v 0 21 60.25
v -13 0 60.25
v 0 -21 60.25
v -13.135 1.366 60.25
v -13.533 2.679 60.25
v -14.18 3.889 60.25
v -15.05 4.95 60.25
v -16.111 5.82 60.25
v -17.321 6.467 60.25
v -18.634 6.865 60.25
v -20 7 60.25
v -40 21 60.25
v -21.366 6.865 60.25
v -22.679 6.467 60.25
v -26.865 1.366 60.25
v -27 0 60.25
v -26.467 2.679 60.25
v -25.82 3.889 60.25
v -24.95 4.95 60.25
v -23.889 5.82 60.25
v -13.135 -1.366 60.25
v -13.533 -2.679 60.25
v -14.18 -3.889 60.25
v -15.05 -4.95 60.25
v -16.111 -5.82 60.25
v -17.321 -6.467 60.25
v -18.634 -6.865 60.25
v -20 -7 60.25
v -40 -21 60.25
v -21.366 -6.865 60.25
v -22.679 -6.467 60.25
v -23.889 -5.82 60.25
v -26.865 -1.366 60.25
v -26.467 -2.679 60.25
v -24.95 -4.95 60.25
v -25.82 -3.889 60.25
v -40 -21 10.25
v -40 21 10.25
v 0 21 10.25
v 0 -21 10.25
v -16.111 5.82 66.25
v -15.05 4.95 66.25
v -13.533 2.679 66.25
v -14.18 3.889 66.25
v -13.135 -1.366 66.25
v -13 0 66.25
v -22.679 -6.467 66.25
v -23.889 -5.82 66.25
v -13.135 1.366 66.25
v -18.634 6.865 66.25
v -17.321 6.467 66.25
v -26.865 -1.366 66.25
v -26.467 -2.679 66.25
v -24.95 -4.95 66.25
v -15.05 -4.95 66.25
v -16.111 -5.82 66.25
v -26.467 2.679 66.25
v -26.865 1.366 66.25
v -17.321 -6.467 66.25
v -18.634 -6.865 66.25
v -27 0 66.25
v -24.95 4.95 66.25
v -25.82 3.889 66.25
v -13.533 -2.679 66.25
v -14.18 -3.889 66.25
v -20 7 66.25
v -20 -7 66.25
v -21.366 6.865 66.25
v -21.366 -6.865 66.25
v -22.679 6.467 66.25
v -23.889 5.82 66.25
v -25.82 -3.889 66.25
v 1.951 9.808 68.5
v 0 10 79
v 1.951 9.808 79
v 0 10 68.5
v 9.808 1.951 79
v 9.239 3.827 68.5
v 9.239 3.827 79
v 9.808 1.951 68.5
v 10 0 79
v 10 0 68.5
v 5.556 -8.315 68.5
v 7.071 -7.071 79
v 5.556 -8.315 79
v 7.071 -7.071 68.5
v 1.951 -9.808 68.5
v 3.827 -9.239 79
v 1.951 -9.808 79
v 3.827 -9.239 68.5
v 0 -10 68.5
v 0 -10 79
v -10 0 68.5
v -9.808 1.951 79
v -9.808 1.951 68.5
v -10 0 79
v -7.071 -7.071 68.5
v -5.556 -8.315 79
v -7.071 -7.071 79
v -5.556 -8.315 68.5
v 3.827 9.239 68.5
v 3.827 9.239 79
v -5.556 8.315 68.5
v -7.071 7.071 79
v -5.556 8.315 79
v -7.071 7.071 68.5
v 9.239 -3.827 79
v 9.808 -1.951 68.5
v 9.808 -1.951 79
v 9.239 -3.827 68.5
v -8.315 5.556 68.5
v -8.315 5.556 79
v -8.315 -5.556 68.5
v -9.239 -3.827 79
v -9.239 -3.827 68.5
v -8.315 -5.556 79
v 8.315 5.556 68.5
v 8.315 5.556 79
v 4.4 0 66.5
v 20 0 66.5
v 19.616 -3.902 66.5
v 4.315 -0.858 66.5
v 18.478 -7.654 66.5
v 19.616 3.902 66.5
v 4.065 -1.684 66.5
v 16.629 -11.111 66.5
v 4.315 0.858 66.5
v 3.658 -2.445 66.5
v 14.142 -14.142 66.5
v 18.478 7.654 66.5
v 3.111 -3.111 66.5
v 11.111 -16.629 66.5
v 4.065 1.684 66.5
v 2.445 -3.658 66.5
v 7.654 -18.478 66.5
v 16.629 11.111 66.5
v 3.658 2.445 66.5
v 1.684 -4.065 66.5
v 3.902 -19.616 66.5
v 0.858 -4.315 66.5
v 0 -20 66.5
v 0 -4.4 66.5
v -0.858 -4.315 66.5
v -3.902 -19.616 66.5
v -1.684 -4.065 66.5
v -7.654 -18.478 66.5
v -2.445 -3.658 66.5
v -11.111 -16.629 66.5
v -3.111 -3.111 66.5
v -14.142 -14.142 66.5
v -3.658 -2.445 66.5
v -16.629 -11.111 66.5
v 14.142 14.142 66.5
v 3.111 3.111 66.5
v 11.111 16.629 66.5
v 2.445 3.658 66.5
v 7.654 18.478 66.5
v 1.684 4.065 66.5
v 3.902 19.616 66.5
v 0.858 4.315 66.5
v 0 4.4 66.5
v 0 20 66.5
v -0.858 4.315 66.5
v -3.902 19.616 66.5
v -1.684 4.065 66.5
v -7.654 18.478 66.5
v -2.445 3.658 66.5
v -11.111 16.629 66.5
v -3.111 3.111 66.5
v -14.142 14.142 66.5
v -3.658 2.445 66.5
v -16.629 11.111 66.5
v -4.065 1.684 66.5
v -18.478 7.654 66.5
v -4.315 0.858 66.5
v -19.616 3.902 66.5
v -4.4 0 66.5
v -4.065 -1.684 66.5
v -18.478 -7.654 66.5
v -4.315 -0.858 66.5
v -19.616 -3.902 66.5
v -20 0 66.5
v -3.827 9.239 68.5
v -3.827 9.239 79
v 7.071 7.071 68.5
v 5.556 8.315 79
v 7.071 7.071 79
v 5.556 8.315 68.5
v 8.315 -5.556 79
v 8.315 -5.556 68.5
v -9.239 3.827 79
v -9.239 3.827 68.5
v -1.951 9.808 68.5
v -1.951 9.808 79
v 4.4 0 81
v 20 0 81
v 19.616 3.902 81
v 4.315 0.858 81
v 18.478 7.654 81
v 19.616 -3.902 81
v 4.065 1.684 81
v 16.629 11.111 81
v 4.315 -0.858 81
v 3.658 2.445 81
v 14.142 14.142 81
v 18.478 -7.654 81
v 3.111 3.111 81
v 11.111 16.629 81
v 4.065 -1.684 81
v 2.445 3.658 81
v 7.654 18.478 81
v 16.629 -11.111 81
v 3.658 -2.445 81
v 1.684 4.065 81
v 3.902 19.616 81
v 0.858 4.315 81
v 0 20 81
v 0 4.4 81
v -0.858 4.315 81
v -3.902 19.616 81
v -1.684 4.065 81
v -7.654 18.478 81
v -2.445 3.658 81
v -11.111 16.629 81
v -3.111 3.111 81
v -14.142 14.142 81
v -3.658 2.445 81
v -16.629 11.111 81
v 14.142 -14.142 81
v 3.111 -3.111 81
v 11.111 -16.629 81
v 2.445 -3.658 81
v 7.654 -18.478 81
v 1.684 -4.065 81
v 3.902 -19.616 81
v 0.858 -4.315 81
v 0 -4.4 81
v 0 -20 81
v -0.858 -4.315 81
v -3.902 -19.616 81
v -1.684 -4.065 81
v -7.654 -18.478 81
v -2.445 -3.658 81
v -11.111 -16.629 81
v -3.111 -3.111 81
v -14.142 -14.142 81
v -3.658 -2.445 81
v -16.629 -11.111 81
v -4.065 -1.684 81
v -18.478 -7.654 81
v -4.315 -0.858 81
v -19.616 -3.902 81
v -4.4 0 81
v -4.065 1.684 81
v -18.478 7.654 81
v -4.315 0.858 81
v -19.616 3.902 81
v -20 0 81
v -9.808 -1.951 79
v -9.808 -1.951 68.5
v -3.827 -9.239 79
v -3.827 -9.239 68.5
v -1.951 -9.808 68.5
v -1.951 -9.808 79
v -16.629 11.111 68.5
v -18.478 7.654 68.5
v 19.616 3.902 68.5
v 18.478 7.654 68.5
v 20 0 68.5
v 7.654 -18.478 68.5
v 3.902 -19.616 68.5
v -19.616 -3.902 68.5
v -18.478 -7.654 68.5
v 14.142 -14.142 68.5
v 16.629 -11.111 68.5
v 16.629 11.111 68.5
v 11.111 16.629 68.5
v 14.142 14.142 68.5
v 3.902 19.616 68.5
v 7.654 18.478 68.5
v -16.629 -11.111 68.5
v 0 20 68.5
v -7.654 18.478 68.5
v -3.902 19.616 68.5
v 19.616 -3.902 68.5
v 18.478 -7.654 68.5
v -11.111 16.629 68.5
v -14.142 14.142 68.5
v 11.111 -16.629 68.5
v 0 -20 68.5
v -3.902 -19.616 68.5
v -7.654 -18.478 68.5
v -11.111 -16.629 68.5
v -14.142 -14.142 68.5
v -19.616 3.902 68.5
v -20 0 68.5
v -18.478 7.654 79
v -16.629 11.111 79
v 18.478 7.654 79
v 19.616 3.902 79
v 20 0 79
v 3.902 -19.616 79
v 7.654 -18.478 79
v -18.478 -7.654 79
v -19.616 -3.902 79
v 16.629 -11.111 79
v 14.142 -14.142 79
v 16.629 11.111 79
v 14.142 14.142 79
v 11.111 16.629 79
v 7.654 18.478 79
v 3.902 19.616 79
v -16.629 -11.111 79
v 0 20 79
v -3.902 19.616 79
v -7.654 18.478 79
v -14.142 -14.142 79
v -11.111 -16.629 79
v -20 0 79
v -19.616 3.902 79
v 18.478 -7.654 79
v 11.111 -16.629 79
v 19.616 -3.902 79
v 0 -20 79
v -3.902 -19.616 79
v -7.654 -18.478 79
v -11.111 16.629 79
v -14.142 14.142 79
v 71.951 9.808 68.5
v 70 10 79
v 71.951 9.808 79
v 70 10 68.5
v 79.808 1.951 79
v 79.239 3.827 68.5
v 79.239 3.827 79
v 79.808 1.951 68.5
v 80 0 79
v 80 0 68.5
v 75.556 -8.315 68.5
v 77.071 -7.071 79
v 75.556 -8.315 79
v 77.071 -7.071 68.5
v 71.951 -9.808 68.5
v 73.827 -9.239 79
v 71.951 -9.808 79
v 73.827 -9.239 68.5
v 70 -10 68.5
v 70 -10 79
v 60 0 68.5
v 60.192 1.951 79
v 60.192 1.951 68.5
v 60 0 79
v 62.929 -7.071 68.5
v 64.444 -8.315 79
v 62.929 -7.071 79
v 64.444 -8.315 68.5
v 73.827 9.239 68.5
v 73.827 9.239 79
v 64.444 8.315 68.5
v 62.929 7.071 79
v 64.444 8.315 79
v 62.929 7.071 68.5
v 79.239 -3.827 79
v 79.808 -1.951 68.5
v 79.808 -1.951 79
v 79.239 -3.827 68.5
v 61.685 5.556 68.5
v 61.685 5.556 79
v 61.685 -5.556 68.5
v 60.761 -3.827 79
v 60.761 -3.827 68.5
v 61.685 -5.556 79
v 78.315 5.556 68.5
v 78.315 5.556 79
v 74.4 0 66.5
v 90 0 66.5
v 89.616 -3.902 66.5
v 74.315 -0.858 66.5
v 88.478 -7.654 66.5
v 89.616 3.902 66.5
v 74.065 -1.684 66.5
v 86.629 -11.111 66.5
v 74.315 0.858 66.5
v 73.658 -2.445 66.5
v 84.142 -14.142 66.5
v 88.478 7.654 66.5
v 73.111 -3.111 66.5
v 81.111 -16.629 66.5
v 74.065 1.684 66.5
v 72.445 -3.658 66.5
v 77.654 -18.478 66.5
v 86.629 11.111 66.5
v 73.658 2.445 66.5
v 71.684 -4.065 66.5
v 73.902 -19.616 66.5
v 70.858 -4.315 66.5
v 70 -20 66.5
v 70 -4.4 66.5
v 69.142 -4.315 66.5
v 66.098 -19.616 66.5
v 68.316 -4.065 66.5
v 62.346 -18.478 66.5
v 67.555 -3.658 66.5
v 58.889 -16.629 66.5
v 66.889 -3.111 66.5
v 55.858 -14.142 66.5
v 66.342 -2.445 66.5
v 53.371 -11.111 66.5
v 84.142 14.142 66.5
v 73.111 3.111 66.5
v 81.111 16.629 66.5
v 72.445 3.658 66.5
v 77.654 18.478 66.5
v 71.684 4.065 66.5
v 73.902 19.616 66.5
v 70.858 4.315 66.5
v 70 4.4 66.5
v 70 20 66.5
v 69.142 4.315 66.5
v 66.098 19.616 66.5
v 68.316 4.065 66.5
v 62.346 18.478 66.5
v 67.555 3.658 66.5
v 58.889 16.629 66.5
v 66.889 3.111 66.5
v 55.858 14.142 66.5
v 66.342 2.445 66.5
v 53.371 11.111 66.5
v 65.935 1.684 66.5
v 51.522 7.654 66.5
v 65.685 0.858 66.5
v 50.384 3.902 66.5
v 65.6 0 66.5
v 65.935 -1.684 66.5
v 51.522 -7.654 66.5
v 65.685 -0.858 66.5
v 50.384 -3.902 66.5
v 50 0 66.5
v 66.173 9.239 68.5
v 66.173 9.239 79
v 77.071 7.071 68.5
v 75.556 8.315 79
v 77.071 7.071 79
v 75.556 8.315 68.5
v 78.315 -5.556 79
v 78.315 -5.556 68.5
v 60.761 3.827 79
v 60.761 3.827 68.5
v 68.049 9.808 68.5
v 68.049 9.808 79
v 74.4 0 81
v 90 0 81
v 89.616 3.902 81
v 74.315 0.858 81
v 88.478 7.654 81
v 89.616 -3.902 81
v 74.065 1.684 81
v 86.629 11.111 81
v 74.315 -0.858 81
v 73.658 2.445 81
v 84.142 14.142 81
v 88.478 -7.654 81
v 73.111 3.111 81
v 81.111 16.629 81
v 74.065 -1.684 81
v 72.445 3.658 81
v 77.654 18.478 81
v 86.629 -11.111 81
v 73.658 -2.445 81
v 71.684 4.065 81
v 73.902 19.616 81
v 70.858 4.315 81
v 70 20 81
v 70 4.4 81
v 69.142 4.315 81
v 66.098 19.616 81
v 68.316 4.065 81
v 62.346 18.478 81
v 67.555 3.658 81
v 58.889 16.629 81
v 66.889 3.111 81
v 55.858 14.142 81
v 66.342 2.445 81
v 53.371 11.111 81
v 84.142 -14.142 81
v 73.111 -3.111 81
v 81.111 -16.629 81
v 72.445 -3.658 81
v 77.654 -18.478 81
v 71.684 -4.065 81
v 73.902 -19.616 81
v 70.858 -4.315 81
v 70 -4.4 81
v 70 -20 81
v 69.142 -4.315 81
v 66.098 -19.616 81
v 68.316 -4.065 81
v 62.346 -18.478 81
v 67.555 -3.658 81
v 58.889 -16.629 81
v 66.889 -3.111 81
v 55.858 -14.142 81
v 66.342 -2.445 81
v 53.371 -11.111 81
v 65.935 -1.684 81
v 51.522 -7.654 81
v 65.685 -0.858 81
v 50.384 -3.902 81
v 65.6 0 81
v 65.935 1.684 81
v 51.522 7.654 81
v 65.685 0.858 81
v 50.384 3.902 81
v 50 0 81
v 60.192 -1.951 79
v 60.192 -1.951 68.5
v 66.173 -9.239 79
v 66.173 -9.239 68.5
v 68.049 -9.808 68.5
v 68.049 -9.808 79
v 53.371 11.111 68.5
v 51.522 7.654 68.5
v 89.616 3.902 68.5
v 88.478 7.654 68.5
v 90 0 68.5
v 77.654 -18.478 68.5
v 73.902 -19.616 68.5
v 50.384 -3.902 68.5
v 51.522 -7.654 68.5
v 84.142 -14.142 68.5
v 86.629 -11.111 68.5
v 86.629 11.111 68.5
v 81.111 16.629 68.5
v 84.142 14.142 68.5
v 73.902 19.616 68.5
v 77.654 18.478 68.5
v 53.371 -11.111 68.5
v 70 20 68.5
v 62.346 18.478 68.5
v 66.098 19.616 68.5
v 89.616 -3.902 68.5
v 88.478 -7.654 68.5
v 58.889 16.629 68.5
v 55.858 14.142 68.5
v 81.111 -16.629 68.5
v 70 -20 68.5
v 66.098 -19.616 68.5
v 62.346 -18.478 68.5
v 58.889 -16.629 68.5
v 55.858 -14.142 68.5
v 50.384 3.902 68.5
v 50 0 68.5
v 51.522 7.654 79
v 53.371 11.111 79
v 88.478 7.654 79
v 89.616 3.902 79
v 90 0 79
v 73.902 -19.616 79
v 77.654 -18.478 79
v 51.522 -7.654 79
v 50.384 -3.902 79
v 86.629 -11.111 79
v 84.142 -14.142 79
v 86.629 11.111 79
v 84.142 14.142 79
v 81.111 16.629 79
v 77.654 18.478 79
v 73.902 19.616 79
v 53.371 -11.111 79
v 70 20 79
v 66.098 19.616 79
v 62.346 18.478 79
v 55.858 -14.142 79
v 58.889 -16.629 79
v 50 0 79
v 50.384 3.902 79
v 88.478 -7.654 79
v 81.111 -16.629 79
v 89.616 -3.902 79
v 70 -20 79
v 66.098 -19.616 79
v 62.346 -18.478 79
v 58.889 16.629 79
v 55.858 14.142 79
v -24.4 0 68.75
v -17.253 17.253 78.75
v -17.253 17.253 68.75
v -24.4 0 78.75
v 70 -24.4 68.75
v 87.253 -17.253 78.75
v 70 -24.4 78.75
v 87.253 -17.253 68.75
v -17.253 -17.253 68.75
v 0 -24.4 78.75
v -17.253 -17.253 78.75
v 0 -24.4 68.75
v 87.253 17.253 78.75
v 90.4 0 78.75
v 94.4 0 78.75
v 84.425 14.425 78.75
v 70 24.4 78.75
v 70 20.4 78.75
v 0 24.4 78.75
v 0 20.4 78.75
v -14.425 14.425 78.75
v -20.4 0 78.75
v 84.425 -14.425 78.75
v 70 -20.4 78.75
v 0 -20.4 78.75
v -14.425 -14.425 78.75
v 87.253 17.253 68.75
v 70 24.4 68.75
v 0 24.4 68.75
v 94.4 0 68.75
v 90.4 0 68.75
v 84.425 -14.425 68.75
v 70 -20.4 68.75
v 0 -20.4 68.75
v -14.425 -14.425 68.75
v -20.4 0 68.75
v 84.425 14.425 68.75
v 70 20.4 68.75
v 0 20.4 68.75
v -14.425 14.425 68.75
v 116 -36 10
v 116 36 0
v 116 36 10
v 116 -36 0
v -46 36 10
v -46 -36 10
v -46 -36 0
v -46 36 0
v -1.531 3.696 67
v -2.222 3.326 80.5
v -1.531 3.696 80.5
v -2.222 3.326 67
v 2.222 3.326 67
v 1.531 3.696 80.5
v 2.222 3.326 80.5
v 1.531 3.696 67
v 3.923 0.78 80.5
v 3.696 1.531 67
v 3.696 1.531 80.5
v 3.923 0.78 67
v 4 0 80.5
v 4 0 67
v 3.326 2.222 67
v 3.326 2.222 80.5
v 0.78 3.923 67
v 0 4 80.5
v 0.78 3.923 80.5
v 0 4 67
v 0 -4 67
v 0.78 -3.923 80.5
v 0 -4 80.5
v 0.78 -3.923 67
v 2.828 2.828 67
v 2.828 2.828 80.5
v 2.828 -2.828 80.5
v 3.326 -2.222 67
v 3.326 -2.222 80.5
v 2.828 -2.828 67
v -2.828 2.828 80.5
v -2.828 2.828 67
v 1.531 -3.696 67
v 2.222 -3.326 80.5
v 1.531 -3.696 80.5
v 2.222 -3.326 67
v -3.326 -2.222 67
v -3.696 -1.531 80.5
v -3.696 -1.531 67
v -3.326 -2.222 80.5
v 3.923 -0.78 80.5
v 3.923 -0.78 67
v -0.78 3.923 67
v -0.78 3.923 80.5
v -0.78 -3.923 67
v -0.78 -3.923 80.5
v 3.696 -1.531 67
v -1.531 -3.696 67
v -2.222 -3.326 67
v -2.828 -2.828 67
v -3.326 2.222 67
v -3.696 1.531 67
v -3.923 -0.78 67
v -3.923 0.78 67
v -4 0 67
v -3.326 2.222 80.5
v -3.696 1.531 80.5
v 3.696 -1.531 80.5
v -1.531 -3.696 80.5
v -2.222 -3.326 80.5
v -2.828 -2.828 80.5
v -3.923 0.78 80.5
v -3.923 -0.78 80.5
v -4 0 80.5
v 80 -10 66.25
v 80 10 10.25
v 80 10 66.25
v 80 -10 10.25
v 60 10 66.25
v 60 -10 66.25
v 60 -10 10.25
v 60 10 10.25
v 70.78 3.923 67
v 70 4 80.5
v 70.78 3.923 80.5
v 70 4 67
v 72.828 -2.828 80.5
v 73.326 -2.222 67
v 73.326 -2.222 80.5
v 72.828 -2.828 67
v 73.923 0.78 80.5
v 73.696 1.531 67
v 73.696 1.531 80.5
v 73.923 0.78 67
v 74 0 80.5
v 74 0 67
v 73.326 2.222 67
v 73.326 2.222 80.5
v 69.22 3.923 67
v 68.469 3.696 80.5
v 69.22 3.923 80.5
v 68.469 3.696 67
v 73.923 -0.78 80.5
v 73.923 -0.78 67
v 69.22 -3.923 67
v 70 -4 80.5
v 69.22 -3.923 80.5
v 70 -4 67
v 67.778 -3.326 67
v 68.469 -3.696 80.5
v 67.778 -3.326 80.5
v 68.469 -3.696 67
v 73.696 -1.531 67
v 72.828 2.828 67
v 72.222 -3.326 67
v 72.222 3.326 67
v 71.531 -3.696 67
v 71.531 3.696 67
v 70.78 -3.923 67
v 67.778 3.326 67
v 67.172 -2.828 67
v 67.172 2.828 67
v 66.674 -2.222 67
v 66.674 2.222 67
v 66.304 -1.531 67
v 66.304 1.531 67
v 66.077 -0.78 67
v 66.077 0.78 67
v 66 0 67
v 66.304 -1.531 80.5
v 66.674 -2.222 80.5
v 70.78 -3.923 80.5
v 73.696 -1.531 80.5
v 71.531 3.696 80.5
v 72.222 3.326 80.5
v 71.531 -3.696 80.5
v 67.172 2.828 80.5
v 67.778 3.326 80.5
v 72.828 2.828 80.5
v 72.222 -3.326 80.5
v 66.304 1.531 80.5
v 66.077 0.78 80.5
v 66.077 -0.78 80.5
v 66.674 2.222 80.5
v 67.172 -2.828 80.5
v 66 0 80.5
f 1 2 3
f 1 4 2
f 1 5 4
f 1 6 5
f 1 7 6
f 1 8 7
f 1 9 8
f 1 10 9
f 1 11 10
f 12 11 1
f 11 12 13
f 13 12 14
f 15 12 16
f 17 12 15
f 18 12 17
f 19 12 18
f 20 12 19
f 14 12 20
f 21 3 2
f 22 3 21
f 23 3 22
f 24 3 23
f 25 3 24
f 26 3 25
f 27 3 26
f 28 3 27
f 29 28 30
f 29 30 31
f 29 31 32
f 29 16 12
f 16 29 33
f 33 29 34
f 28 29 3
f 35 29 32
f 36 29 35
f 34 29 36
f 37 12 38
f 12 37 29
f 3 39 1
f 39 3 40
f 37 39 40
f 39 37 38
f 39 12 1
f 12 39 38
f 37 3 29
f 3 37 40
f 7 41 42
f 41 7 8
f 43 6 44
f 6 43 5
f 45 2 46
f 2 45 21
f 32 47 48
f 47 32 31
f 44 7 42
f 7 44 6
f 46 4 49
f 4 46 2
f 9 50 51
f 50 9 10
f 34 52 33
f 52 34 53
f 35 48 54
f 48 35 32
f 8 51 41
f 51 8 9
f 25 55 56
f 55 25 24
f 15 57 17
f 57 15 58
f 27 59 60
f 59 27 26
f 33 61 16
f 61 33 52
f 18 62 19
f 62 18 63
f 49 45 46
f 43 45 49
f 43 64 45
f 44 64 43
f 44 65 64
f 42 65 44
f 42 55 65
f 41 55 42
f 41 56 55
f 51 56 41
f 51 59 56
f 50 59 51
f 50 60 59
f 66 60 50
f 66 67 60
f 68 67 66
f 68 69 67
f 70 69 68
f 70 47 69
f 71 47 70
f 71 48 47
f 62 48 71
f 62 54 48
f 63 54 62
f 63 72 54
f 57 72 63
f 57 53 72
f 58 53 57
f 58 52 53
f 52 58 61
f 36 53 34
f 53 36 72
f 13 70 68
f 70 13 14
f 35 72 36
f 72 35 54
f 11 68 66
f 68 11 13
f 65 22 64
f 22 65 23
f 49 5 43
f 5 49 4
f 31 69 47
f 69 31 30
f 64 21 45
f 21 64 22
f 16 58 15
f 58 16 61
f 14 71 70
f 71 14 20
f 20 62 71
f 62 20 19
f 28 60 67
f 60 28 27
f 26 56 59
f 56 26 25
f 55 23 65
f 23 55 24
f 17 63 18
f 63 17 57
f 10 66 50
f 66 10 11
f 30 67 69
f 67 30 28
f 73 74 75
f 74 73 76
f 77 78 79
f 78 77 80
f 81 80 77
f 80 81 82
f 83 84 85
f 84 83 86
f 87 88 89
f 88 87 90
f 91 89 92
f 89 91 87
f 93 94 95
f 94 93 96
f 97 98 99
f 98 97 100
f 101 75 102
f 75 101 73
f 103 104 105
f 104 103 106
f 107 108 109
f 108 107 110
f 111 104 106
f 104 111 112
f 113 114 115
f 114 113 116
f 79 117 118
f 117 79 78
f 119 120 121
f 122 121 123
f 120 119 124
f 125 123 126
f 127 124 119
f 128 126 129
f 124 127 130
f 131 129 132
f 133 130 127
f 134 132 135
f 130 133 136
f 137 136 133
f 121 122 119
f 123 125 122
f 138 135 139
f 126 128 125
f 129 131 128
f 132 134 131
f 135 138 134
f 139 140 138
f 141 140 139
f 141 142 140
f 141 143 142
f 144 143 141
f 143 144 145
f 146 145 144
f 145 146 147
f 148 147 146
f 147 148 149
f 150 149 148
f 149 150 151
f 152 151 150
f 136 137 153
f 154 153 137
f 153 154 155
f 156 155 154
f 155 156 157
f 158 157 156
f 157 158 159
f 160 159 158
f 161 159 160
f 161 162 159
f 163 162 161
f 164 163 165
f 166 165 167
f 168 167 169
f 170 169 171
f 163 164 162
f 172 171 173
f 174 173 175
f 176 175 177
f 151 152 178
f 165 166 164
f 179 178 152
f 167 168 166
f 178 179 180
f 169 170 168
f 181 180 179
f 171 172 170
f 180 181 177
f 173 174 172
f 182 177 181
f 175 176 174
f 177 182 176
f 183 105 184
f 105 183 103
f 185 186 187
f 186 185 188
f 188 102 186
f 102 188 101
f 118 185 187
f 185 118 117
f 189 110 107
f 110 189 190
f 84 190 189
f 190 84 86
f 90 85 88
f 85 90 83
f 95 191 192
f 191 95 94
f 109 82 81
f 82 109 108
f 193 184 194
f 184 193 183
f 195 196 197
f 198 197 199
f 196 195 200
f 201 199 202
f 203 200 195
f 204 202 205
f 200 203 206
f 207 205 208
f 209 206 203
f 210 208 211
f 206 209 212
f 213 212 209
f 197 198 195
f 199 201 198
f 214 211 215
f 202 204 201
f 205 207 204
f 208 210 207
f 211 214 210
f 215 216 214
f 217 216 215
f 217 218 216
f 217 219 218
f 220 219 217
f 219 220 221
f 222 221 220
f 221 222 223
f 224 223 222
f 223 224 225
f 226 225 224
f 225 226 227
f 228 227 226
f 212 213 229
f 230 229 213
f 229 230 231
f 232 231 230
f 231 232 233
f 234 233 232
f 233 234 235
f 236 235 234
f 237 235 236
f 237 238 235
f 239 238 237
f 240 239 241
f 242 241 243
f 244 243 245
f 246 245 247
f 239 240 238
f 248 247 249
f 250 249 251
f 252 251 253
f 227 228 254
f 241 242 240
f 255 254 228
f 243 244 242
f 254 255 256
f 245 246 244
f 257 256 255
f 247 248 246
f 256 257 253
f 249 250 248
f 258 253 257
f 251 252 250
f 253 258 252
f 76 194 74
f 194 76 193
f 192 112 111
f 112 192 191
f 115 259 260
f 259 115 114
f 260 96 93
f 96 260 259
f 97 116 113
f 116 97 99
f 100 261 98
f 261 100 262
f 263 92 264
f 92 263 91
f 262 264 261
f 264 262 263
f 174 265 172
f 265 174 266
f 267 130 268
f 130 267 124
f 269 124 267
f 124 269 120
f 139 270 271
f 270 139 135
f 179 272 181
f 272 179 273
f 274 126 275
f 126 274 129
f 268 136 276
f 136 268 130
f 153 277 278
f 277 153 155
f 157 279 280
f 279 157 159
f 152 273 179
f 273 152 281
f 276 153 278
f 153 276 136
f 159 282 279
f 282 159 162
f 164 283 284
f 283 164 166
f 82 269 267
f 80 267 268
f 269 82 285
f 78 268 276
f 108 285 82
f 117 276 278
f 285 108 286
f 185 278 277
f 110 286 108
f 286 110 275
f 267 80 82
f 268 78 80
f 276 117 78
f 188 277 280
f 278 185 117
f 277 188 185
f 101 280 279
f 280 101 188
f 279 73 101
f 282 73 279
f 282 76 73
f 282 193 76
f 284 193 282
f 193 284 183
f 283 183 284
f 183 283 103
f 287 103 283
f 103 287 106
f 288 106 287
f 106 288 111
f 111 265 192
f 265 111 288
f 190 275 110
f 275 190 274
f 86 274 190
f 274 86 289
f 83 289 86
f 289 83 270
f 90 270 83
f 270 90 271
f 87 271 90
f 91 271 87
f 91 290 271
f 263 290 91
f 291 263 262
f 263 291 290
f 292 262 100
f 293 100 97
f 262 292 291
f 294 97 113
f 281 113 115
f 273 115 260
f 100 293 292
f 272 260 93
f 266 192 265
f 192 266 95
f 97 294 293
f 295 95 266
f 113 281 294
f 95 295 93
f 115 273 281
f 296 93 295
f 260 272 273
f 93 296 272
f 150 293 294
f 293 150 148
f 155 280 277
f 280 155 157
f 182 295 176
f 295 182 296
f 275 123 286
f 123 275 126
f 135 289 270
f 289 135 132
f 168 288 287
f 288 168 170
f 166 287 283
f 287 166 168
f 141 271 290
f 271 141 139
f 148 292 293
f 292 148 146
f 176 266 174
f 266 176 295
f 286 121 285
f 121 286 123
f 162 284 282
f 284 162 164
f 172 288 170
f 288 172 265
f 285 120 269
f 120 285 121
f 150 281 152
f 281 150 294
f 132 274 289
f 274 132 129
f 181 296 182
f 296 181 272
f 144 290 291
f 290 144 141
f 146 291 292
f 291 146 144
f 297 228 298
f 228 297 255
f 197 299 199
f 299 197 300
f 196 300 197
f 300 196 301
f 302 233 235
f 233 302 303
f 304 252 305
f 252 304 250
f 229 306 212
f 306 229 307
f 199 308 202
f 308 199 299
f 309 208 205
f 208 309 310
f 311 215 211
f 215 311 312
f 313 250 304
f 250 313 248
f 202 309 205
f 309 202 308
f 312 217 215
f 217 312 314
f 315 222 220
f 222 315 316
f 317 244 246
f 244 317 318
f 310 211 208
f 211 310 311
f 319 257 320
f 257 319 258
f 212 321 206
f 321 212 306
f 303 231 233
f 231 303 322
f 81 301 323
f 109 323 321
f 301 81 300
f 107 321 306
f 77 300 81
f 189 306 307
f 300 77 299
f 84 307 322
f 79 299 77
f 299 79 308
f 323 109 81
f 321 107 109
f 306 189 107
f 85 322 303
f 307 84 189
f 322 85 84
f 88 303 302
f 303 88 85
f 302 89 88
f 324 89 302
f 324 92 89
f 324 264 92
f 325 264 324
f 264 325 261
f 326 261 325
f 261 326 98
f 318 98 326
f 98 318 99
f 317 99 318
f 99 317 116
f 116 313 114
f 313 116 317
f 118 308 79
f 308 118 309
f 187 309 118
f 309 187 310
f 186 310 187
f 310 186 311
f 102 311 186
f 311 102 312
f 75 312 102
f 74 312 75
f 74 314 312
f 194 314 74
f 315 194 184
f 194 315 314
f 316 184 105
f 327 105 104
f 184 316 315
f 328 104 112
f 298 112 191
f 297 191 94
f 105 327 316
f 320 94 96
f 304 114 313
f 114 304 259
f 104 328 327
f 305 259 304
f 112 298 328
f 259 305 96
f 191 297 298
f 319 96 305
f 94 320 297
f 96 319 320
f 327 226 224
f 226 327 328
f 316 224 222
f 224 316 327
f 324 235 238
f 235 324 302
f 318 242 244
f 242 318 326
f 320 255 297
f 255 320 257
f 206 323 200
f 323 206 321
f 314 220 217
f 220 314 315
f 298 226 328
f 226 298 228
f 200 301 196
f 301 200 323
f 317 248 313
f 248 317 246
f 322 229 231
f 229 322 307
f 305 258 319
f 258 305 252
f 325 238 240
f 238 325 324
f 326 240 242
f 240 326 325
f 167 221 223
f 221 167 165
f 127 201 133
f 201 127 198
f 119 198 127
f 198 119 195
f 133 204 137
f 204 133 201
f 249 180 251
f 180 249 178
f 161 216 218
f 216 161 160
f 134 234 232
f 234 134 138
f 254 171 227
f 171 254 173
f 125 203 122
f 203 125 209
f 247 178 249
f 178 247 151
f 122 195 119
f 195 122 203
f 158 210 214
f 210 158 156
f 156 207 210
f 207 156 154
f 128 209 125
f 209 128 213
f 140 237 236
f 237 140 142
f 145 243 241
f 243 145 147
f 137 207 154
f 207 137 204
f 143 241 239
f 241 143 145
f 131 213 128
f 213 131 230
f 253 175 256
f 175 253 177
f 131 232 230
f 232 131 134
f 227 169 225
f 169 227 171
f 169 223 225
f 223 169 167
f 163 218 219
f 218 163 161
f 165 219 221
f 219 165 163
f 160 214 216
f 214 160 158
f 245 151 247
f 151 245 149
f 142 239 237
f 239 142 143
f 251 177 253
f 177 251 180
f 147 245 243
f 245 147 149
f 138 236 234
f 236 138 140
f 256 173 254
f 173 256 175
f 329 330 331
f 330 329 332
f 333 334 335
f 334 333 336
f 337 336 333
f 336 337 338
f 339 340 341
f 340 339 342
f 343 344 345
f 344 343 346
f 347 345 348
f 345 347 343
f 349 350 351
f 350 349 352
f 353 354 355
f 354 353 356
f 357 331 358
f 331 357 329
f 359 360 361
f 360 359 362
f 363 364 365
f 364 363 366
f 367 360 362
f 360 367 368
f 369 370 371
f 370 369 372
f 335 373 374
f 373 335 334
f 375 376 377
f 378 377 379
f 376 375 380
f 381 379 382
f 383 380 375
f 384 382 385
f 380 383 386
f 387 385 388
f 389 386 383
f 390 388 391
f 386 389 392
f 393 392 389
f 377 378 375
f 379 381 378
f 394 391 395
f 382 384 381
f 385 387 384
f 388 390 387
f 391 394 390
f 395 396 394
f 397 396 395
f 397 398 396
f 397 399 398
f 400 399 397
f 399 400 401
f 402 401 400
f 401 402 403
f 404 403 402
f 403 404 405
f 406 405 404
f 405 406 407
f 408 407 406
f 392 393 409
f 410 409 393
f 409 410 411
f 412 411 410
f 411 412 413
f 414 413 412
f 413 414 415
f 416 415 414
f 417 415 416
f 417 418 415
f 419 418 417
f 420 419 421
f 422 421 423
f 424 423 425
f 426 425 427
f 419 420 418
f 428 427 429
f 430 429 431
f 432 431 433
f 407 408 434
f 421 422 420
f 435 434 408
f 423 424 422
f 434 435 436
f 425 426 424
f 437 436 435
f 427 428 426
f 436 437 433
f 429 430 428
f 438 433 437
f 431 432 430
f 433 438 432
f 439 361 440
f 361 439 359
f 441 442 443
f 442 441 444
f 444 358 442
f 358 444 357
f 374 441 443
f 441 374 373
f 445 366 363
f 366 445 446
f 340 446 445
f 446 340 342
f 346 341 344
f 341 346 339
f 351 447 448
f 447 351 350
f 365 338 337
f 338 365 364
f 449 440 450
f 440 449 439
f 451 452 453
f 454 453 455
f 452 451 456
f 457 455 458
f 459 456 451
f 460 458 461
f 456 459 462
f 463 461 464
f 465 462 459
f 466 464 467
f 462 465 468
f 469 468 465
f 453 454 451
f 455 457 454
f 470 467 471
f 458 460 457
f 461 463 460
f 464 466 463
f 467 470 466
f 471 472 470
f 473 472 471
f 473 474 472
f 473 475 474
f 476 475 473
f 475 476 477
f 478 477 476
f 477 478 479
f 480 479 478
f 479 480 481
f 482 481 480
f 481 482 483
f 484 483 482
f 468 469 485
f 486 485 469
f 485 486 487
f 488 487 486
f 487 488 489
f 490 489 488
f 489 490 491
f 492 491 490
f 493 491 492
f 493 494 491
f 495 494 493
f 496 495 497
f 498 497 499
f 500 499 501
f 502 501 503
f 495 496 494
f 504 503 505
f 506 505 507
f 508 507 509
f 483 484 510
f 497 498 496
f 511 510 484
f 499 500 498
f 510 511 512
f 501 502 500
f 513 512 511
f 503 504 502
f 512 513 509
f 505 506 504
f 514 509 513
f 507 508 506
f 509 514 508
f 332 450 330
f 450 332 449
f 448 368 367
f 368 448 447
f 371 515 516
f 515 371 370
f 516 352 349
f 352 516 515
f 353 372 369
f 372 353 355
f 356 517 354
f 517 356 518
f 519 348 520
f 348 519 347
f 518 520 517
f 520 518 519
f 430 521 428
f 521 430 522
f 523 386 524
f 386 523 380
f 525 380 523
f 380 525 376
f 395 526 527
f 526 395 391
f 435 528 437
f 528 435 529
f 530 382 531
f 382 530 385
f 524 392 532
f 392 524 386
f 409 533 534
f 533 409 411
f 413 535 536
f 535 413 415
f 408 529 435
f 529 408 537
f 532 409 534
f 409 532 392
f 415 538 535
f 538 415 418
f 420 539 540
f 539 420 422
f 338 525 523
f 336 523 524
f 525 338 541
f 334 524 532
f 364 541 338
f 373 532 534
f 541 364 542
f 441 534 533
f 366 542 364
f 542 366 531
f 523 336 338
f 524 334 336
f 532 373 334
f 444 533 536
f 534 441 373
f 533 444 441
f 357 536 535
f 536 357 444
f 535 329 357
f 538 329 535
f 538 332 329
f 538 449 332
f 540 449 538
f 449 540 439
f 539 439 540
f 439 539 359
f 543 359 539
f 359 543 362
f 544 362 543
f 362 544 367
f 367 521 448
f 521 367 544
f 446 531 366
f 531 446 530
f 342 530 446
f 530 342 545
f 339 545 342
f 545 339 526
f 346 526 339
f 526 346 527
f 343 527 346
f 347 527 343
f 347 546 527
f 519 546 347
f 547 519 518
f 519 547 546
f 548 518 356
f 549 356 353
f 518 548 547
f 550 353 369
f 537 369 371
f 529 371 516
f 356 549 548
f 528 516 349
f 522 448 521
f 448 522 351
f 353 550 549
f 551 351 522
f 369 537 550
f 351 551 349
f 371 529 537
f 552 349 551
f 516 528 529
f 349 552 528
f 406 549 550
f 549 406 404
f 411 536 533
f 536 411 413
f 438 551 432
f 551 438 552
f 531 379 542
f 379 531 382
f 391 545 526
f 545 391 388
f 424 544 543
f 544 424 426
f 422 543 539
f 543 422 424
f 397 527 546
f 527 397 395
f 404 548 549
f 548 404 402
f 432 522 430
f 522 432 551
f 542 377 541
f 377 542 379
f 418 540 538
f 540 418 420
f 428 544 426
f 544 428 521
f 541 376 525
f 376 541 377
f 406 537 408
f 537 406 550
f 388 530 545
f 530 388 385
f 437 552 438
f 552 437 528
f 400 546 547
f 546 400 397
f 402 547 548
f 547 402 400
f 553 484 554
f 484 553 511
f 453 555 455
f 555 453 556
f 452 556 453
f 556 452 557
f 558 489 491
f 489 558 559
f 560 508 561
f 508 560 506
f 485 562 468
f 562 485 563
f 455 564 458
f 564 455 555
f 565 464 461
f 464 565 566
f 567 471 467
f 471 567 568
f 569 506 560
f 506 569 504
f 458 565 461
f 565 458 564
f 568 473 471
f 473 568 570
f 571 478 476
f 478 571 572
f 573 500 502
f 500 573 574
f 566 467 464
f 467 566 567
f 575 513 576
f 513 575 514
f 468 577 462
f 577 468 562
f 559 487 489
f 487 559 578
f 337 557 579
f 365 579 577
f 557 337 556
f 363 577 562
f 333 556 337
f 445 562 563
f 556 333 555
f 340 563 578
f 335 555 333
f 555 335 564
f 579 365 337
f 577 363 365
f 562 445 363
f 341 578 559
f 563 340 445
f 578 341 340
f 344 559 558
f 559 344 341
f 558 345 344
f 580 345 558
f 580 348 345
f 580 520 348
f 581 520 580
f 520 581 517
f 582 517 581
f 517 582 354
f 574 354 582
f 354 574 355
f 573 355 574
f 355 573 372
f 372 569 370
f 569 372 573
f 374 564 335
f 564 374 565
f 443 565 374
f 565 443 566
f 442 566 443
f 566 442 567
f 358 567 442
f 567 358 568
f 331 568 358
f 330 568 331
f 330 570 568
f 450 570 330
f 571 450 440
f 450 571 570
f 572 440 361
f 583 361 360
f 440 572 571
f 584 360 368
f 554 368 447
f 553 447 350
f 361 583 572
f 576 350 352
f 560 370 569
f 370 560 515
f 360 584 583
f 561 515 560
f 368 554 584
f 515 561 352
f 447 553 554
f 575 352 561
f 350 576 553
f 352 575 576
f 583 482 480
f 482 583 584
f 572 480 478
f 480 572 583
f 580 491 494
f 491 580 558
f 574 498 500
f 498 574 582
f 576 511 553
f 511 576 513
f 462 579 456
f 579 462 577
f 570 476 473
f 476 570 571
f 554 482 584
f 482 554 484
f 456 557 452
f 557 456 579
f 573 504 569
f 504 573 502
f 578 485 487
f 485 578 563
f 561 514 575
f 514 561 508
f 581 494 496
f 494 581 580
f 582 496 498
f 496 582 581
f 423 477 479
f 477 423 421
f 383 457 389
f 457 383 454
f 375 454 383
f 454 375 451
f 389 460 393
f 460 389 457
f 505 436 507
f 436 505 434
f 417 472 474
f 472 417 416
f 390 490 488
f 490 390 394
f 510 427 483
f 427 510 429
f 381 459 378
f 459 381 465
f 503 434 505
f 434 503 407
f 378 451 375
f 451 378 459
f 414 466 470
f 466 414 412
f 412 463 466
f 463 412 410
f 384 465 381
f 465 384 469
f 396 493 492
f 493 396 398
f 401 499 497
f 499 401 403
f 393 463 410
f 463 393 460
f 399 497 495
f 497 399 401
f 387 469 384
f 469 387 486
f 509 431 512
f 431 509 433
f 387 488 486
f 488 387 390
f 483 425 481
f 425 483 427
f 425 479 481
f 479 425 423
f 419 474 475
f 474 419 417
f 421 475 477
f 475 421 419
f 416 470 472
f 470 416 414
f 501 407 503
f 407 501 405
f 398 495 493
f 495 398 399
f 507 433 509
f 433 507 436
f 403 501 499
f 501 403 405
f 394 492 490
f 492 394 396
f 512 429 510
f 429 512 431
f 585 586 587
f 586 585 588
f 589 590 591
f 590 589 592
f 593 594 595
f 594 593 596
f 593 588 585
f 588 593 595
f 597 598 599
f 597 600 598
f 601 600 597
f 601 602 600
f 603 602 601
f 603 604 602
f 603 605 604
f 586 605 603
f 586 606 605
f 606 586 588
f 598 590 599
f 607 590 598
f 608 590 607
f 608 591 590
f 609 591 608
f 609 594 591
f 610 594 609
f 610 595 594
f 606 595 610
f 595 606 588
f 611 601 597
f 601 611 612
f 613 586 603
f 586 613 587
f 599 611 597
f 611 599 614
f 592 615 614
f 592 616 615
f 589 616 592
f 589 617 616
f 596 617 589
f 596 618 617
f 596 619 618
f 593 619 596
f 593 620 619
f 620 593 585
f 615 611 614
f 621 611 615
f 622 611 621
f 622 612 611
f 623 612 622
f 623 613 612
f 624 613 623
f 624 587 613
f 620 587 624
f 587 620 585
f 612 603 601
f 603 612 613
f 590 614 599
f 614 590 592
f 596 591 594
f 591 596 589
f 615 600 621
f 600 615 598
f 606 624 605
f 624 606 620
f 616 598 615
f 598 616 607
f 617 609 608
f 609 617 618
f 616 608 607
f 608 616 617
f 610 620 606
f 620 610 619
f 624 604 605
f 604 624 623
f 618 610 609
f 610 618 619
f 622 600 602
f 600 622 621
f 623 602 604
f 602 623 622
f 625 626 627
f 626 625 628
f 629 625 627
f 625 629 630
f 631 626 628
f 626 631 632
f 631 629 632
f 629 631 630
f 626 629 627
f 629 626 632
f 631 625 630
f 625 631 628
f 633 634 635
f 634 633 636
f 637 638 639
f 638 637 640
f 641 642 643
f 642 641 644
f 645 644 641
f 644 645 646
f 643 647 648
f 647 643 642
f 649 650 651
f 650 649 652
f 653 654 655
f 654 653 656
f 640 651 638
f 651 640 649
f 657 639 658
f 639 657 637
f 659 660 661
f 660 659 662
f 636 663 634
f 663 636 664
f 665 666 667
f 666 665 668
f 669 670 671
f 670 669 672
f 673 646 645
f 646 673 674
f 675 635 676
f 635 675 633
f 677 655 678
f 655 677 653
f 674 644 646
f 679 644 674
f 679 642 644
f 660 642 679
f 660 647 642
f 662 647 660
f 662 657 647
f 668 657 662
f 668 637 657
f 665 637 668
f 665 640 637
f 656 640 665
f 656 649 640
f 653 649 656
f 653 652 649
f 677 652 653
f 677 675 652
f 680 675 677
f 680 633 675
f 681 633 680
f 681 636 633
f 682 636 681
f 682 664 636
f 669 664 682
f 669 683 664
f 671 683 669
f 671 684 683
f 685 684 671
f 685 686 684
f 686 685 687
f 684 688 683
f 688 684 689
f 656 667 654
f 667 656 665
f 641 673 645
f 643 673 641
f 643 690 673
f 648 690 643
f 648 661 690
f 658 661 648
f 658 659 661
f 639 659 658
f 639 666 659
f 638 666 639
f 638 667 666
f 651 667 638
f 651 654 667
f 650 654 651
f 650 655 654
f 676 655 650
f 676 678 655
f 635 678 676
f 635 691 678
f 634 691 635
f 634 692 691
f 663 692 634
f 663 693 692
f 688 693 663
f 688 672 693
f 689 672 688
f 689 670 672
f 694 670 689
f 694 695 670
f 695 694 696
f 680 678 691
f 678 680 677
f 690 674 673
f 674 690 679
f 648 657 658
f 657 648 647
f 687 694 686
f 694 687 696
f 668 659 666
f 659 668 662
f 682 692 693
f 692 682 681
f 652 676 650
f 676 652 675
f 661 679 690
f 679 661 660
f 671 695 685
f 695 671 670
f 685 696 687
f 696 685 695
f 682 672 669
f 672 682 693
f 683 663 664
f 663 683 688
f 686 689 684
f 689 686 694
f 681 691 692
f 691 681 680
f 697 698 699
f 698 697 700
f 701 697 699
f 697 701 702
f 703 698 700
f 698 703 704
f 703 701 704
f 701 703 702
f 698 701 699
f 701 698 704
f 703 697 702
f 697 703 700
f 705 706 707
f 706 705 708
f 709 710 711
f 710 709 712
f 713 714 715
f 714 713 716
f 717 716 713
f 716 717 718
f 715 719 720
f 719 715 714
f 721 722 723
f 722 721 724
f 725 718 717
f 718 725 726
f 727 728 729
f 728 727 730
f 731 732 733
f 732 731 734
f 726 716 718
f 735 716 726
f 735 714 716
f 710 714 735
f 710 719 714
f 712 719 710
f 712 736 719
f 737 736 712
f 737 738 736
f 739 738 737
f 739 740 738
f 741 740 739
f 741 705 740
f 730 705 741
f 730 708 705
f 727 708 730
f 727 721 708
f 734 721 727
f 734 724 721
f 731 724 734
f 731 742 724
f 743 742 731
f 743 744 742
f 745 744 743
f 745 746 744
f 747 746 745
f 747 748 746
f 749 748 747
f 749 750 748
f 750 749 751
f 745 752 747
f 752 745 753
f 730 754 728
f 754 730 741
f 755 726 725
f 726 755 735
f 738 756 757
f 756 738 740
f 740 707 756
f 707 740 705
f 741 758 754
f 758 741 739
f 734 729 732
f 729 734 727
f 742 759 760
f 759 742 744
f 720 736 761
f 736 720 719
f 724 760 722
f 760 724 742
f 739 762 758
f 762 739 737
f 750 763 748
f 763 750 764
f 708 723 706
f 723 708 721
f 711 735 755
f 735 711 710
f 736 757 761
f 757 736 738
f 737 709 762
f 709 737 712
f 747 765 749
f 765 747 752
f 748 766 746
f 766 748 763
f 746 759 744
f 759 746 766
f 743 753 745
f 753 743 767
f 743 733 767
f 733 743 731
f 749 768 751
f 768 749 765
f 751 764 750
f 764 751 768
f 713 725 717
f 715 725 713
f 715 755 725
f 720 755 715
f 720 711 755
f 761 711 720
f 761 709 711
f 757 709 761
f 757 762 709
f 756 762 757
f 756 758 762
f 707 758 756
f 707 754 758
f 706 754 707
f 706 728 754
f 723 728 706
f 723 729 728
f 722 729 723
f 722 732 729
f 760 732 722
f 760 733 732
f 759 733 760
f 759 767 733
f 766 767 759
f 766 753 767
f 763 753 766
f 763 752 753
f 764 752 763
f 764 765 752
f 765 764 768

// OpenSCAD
$fn = 32;

// ------------------------------------------------------------------------
// Motor belt drive: span 70 mm, pulleys d40, belt 10 mm wide
// Every part is its own module, assembly() places every instance.
// ------------------------------------------------------------------------

// --- part 1 ---
module base_plate() {
  difference() {
    translate([-81, -36, 0]) cube([162, 72, 10]);
  }
}

// --- part 2 ---
module motor() {
  union() {
    translate([-25, -21, 0]) cube([50, 42, 40]);
    translate([28, 0, 20]) rotate([0, 90, 0]) cylinder(h = 6, d = 14, center = true);
  }
}

// --- part 3 ---
module drive_shaft() {
  translate([0, 0, -6.75]) cylinder(h = 13.5, d = 8);
}

// --- part 4 ---
module pulley_drive() {
  difference() {
    union() {
      cylinder(h = 14.5, d = 20);
      cylinder(h = 2, d = 40);
      translate([0, 0, 12.5]) cylinder(h = 2, d = 40);
    }
    translate([0, 0, -1]) cylinder(h = 16.5, d = 8.8);
  }
}

// --- part 5 ---
module idler_post() {
  translate([-10, -10, 0]) cube([20, 20, 56]);
}

// --- part 6 ---
module driven_shaft() {
  translate([0, 0, -6.75]) cylinder(h = 13.5, d = 8);
}

// --- part 7 ---
module pulley_driven() {
  difference() {
    union() {
      cylinder(h = 14.5, d = 20);
      cylinder(h = 2, d = 40);
      translate([0, 0, 12.5]) cylinder(h = 2, d = 40);
    }
    translate([0, 0, -1]) cylinder(h = 16.5, d = 8.8);
  }
}

// --- part 8 ---
module drive_belt() {
  difference() {
    linear_extrude(height = 10) polygon(points = concat([for (a = [90 : 45 : 270]) [24.4 * cos(a), 24.4 * sin(a)]], [for (a = [270 : 45 : 450]) [70 + 24.4 * cos(a), 24.4 * sin(a)]]));
    translate([0, 0, -1]) linear_extrude(height = 12) polygon(points = concat([for (a = [90 : 45 : 270]) [20.4 * cos(a), 20.4 * sin(a)]], [for (a = [270 : 45 : 450]) [70 + 20.4 * cos(a), 20.4 * sin(a)]]));
  }
}

// --- assembly ---
module assembly() {
  color([0.80, 0.24, 0.20]) translate([35, 0, 0]) rotate([0, 0, 0]) base_plate();
  color([0.20, 0.45, 0.75]) translate([0, 0, 35.25]) rotate([0, 270, 0]) motor();
  color([0.25, 0.62, 0.32]) translate([0, 0, 73.75]) rotate([0, 0, 0]) drive_shaft();
  color([0.92, 0.70, 0.18]) translate([0, 0, 66.5]) rotate([0, 0, 0]) pulley_drive();
  color([0.58, 0.35, 0.70]) translate([70, 0, 10.25]) rotate([0, 0, 0]) idler_post();
  color([0.16, 0.66, 0.66]) translate([70, 0, 73.75]) rotate([0, 0, 0]) driven_shaft();
  color([0.85, 0.48, 0.18]) translate([70, 0, 66.5]) rotate([0, 0, 0]) pulley_driven();
  color([0.55, 0.60, 0.65]) translate([0, 0, 68.75]) rotate([0, 0, 0]) drive_belt();
}

assembly();
